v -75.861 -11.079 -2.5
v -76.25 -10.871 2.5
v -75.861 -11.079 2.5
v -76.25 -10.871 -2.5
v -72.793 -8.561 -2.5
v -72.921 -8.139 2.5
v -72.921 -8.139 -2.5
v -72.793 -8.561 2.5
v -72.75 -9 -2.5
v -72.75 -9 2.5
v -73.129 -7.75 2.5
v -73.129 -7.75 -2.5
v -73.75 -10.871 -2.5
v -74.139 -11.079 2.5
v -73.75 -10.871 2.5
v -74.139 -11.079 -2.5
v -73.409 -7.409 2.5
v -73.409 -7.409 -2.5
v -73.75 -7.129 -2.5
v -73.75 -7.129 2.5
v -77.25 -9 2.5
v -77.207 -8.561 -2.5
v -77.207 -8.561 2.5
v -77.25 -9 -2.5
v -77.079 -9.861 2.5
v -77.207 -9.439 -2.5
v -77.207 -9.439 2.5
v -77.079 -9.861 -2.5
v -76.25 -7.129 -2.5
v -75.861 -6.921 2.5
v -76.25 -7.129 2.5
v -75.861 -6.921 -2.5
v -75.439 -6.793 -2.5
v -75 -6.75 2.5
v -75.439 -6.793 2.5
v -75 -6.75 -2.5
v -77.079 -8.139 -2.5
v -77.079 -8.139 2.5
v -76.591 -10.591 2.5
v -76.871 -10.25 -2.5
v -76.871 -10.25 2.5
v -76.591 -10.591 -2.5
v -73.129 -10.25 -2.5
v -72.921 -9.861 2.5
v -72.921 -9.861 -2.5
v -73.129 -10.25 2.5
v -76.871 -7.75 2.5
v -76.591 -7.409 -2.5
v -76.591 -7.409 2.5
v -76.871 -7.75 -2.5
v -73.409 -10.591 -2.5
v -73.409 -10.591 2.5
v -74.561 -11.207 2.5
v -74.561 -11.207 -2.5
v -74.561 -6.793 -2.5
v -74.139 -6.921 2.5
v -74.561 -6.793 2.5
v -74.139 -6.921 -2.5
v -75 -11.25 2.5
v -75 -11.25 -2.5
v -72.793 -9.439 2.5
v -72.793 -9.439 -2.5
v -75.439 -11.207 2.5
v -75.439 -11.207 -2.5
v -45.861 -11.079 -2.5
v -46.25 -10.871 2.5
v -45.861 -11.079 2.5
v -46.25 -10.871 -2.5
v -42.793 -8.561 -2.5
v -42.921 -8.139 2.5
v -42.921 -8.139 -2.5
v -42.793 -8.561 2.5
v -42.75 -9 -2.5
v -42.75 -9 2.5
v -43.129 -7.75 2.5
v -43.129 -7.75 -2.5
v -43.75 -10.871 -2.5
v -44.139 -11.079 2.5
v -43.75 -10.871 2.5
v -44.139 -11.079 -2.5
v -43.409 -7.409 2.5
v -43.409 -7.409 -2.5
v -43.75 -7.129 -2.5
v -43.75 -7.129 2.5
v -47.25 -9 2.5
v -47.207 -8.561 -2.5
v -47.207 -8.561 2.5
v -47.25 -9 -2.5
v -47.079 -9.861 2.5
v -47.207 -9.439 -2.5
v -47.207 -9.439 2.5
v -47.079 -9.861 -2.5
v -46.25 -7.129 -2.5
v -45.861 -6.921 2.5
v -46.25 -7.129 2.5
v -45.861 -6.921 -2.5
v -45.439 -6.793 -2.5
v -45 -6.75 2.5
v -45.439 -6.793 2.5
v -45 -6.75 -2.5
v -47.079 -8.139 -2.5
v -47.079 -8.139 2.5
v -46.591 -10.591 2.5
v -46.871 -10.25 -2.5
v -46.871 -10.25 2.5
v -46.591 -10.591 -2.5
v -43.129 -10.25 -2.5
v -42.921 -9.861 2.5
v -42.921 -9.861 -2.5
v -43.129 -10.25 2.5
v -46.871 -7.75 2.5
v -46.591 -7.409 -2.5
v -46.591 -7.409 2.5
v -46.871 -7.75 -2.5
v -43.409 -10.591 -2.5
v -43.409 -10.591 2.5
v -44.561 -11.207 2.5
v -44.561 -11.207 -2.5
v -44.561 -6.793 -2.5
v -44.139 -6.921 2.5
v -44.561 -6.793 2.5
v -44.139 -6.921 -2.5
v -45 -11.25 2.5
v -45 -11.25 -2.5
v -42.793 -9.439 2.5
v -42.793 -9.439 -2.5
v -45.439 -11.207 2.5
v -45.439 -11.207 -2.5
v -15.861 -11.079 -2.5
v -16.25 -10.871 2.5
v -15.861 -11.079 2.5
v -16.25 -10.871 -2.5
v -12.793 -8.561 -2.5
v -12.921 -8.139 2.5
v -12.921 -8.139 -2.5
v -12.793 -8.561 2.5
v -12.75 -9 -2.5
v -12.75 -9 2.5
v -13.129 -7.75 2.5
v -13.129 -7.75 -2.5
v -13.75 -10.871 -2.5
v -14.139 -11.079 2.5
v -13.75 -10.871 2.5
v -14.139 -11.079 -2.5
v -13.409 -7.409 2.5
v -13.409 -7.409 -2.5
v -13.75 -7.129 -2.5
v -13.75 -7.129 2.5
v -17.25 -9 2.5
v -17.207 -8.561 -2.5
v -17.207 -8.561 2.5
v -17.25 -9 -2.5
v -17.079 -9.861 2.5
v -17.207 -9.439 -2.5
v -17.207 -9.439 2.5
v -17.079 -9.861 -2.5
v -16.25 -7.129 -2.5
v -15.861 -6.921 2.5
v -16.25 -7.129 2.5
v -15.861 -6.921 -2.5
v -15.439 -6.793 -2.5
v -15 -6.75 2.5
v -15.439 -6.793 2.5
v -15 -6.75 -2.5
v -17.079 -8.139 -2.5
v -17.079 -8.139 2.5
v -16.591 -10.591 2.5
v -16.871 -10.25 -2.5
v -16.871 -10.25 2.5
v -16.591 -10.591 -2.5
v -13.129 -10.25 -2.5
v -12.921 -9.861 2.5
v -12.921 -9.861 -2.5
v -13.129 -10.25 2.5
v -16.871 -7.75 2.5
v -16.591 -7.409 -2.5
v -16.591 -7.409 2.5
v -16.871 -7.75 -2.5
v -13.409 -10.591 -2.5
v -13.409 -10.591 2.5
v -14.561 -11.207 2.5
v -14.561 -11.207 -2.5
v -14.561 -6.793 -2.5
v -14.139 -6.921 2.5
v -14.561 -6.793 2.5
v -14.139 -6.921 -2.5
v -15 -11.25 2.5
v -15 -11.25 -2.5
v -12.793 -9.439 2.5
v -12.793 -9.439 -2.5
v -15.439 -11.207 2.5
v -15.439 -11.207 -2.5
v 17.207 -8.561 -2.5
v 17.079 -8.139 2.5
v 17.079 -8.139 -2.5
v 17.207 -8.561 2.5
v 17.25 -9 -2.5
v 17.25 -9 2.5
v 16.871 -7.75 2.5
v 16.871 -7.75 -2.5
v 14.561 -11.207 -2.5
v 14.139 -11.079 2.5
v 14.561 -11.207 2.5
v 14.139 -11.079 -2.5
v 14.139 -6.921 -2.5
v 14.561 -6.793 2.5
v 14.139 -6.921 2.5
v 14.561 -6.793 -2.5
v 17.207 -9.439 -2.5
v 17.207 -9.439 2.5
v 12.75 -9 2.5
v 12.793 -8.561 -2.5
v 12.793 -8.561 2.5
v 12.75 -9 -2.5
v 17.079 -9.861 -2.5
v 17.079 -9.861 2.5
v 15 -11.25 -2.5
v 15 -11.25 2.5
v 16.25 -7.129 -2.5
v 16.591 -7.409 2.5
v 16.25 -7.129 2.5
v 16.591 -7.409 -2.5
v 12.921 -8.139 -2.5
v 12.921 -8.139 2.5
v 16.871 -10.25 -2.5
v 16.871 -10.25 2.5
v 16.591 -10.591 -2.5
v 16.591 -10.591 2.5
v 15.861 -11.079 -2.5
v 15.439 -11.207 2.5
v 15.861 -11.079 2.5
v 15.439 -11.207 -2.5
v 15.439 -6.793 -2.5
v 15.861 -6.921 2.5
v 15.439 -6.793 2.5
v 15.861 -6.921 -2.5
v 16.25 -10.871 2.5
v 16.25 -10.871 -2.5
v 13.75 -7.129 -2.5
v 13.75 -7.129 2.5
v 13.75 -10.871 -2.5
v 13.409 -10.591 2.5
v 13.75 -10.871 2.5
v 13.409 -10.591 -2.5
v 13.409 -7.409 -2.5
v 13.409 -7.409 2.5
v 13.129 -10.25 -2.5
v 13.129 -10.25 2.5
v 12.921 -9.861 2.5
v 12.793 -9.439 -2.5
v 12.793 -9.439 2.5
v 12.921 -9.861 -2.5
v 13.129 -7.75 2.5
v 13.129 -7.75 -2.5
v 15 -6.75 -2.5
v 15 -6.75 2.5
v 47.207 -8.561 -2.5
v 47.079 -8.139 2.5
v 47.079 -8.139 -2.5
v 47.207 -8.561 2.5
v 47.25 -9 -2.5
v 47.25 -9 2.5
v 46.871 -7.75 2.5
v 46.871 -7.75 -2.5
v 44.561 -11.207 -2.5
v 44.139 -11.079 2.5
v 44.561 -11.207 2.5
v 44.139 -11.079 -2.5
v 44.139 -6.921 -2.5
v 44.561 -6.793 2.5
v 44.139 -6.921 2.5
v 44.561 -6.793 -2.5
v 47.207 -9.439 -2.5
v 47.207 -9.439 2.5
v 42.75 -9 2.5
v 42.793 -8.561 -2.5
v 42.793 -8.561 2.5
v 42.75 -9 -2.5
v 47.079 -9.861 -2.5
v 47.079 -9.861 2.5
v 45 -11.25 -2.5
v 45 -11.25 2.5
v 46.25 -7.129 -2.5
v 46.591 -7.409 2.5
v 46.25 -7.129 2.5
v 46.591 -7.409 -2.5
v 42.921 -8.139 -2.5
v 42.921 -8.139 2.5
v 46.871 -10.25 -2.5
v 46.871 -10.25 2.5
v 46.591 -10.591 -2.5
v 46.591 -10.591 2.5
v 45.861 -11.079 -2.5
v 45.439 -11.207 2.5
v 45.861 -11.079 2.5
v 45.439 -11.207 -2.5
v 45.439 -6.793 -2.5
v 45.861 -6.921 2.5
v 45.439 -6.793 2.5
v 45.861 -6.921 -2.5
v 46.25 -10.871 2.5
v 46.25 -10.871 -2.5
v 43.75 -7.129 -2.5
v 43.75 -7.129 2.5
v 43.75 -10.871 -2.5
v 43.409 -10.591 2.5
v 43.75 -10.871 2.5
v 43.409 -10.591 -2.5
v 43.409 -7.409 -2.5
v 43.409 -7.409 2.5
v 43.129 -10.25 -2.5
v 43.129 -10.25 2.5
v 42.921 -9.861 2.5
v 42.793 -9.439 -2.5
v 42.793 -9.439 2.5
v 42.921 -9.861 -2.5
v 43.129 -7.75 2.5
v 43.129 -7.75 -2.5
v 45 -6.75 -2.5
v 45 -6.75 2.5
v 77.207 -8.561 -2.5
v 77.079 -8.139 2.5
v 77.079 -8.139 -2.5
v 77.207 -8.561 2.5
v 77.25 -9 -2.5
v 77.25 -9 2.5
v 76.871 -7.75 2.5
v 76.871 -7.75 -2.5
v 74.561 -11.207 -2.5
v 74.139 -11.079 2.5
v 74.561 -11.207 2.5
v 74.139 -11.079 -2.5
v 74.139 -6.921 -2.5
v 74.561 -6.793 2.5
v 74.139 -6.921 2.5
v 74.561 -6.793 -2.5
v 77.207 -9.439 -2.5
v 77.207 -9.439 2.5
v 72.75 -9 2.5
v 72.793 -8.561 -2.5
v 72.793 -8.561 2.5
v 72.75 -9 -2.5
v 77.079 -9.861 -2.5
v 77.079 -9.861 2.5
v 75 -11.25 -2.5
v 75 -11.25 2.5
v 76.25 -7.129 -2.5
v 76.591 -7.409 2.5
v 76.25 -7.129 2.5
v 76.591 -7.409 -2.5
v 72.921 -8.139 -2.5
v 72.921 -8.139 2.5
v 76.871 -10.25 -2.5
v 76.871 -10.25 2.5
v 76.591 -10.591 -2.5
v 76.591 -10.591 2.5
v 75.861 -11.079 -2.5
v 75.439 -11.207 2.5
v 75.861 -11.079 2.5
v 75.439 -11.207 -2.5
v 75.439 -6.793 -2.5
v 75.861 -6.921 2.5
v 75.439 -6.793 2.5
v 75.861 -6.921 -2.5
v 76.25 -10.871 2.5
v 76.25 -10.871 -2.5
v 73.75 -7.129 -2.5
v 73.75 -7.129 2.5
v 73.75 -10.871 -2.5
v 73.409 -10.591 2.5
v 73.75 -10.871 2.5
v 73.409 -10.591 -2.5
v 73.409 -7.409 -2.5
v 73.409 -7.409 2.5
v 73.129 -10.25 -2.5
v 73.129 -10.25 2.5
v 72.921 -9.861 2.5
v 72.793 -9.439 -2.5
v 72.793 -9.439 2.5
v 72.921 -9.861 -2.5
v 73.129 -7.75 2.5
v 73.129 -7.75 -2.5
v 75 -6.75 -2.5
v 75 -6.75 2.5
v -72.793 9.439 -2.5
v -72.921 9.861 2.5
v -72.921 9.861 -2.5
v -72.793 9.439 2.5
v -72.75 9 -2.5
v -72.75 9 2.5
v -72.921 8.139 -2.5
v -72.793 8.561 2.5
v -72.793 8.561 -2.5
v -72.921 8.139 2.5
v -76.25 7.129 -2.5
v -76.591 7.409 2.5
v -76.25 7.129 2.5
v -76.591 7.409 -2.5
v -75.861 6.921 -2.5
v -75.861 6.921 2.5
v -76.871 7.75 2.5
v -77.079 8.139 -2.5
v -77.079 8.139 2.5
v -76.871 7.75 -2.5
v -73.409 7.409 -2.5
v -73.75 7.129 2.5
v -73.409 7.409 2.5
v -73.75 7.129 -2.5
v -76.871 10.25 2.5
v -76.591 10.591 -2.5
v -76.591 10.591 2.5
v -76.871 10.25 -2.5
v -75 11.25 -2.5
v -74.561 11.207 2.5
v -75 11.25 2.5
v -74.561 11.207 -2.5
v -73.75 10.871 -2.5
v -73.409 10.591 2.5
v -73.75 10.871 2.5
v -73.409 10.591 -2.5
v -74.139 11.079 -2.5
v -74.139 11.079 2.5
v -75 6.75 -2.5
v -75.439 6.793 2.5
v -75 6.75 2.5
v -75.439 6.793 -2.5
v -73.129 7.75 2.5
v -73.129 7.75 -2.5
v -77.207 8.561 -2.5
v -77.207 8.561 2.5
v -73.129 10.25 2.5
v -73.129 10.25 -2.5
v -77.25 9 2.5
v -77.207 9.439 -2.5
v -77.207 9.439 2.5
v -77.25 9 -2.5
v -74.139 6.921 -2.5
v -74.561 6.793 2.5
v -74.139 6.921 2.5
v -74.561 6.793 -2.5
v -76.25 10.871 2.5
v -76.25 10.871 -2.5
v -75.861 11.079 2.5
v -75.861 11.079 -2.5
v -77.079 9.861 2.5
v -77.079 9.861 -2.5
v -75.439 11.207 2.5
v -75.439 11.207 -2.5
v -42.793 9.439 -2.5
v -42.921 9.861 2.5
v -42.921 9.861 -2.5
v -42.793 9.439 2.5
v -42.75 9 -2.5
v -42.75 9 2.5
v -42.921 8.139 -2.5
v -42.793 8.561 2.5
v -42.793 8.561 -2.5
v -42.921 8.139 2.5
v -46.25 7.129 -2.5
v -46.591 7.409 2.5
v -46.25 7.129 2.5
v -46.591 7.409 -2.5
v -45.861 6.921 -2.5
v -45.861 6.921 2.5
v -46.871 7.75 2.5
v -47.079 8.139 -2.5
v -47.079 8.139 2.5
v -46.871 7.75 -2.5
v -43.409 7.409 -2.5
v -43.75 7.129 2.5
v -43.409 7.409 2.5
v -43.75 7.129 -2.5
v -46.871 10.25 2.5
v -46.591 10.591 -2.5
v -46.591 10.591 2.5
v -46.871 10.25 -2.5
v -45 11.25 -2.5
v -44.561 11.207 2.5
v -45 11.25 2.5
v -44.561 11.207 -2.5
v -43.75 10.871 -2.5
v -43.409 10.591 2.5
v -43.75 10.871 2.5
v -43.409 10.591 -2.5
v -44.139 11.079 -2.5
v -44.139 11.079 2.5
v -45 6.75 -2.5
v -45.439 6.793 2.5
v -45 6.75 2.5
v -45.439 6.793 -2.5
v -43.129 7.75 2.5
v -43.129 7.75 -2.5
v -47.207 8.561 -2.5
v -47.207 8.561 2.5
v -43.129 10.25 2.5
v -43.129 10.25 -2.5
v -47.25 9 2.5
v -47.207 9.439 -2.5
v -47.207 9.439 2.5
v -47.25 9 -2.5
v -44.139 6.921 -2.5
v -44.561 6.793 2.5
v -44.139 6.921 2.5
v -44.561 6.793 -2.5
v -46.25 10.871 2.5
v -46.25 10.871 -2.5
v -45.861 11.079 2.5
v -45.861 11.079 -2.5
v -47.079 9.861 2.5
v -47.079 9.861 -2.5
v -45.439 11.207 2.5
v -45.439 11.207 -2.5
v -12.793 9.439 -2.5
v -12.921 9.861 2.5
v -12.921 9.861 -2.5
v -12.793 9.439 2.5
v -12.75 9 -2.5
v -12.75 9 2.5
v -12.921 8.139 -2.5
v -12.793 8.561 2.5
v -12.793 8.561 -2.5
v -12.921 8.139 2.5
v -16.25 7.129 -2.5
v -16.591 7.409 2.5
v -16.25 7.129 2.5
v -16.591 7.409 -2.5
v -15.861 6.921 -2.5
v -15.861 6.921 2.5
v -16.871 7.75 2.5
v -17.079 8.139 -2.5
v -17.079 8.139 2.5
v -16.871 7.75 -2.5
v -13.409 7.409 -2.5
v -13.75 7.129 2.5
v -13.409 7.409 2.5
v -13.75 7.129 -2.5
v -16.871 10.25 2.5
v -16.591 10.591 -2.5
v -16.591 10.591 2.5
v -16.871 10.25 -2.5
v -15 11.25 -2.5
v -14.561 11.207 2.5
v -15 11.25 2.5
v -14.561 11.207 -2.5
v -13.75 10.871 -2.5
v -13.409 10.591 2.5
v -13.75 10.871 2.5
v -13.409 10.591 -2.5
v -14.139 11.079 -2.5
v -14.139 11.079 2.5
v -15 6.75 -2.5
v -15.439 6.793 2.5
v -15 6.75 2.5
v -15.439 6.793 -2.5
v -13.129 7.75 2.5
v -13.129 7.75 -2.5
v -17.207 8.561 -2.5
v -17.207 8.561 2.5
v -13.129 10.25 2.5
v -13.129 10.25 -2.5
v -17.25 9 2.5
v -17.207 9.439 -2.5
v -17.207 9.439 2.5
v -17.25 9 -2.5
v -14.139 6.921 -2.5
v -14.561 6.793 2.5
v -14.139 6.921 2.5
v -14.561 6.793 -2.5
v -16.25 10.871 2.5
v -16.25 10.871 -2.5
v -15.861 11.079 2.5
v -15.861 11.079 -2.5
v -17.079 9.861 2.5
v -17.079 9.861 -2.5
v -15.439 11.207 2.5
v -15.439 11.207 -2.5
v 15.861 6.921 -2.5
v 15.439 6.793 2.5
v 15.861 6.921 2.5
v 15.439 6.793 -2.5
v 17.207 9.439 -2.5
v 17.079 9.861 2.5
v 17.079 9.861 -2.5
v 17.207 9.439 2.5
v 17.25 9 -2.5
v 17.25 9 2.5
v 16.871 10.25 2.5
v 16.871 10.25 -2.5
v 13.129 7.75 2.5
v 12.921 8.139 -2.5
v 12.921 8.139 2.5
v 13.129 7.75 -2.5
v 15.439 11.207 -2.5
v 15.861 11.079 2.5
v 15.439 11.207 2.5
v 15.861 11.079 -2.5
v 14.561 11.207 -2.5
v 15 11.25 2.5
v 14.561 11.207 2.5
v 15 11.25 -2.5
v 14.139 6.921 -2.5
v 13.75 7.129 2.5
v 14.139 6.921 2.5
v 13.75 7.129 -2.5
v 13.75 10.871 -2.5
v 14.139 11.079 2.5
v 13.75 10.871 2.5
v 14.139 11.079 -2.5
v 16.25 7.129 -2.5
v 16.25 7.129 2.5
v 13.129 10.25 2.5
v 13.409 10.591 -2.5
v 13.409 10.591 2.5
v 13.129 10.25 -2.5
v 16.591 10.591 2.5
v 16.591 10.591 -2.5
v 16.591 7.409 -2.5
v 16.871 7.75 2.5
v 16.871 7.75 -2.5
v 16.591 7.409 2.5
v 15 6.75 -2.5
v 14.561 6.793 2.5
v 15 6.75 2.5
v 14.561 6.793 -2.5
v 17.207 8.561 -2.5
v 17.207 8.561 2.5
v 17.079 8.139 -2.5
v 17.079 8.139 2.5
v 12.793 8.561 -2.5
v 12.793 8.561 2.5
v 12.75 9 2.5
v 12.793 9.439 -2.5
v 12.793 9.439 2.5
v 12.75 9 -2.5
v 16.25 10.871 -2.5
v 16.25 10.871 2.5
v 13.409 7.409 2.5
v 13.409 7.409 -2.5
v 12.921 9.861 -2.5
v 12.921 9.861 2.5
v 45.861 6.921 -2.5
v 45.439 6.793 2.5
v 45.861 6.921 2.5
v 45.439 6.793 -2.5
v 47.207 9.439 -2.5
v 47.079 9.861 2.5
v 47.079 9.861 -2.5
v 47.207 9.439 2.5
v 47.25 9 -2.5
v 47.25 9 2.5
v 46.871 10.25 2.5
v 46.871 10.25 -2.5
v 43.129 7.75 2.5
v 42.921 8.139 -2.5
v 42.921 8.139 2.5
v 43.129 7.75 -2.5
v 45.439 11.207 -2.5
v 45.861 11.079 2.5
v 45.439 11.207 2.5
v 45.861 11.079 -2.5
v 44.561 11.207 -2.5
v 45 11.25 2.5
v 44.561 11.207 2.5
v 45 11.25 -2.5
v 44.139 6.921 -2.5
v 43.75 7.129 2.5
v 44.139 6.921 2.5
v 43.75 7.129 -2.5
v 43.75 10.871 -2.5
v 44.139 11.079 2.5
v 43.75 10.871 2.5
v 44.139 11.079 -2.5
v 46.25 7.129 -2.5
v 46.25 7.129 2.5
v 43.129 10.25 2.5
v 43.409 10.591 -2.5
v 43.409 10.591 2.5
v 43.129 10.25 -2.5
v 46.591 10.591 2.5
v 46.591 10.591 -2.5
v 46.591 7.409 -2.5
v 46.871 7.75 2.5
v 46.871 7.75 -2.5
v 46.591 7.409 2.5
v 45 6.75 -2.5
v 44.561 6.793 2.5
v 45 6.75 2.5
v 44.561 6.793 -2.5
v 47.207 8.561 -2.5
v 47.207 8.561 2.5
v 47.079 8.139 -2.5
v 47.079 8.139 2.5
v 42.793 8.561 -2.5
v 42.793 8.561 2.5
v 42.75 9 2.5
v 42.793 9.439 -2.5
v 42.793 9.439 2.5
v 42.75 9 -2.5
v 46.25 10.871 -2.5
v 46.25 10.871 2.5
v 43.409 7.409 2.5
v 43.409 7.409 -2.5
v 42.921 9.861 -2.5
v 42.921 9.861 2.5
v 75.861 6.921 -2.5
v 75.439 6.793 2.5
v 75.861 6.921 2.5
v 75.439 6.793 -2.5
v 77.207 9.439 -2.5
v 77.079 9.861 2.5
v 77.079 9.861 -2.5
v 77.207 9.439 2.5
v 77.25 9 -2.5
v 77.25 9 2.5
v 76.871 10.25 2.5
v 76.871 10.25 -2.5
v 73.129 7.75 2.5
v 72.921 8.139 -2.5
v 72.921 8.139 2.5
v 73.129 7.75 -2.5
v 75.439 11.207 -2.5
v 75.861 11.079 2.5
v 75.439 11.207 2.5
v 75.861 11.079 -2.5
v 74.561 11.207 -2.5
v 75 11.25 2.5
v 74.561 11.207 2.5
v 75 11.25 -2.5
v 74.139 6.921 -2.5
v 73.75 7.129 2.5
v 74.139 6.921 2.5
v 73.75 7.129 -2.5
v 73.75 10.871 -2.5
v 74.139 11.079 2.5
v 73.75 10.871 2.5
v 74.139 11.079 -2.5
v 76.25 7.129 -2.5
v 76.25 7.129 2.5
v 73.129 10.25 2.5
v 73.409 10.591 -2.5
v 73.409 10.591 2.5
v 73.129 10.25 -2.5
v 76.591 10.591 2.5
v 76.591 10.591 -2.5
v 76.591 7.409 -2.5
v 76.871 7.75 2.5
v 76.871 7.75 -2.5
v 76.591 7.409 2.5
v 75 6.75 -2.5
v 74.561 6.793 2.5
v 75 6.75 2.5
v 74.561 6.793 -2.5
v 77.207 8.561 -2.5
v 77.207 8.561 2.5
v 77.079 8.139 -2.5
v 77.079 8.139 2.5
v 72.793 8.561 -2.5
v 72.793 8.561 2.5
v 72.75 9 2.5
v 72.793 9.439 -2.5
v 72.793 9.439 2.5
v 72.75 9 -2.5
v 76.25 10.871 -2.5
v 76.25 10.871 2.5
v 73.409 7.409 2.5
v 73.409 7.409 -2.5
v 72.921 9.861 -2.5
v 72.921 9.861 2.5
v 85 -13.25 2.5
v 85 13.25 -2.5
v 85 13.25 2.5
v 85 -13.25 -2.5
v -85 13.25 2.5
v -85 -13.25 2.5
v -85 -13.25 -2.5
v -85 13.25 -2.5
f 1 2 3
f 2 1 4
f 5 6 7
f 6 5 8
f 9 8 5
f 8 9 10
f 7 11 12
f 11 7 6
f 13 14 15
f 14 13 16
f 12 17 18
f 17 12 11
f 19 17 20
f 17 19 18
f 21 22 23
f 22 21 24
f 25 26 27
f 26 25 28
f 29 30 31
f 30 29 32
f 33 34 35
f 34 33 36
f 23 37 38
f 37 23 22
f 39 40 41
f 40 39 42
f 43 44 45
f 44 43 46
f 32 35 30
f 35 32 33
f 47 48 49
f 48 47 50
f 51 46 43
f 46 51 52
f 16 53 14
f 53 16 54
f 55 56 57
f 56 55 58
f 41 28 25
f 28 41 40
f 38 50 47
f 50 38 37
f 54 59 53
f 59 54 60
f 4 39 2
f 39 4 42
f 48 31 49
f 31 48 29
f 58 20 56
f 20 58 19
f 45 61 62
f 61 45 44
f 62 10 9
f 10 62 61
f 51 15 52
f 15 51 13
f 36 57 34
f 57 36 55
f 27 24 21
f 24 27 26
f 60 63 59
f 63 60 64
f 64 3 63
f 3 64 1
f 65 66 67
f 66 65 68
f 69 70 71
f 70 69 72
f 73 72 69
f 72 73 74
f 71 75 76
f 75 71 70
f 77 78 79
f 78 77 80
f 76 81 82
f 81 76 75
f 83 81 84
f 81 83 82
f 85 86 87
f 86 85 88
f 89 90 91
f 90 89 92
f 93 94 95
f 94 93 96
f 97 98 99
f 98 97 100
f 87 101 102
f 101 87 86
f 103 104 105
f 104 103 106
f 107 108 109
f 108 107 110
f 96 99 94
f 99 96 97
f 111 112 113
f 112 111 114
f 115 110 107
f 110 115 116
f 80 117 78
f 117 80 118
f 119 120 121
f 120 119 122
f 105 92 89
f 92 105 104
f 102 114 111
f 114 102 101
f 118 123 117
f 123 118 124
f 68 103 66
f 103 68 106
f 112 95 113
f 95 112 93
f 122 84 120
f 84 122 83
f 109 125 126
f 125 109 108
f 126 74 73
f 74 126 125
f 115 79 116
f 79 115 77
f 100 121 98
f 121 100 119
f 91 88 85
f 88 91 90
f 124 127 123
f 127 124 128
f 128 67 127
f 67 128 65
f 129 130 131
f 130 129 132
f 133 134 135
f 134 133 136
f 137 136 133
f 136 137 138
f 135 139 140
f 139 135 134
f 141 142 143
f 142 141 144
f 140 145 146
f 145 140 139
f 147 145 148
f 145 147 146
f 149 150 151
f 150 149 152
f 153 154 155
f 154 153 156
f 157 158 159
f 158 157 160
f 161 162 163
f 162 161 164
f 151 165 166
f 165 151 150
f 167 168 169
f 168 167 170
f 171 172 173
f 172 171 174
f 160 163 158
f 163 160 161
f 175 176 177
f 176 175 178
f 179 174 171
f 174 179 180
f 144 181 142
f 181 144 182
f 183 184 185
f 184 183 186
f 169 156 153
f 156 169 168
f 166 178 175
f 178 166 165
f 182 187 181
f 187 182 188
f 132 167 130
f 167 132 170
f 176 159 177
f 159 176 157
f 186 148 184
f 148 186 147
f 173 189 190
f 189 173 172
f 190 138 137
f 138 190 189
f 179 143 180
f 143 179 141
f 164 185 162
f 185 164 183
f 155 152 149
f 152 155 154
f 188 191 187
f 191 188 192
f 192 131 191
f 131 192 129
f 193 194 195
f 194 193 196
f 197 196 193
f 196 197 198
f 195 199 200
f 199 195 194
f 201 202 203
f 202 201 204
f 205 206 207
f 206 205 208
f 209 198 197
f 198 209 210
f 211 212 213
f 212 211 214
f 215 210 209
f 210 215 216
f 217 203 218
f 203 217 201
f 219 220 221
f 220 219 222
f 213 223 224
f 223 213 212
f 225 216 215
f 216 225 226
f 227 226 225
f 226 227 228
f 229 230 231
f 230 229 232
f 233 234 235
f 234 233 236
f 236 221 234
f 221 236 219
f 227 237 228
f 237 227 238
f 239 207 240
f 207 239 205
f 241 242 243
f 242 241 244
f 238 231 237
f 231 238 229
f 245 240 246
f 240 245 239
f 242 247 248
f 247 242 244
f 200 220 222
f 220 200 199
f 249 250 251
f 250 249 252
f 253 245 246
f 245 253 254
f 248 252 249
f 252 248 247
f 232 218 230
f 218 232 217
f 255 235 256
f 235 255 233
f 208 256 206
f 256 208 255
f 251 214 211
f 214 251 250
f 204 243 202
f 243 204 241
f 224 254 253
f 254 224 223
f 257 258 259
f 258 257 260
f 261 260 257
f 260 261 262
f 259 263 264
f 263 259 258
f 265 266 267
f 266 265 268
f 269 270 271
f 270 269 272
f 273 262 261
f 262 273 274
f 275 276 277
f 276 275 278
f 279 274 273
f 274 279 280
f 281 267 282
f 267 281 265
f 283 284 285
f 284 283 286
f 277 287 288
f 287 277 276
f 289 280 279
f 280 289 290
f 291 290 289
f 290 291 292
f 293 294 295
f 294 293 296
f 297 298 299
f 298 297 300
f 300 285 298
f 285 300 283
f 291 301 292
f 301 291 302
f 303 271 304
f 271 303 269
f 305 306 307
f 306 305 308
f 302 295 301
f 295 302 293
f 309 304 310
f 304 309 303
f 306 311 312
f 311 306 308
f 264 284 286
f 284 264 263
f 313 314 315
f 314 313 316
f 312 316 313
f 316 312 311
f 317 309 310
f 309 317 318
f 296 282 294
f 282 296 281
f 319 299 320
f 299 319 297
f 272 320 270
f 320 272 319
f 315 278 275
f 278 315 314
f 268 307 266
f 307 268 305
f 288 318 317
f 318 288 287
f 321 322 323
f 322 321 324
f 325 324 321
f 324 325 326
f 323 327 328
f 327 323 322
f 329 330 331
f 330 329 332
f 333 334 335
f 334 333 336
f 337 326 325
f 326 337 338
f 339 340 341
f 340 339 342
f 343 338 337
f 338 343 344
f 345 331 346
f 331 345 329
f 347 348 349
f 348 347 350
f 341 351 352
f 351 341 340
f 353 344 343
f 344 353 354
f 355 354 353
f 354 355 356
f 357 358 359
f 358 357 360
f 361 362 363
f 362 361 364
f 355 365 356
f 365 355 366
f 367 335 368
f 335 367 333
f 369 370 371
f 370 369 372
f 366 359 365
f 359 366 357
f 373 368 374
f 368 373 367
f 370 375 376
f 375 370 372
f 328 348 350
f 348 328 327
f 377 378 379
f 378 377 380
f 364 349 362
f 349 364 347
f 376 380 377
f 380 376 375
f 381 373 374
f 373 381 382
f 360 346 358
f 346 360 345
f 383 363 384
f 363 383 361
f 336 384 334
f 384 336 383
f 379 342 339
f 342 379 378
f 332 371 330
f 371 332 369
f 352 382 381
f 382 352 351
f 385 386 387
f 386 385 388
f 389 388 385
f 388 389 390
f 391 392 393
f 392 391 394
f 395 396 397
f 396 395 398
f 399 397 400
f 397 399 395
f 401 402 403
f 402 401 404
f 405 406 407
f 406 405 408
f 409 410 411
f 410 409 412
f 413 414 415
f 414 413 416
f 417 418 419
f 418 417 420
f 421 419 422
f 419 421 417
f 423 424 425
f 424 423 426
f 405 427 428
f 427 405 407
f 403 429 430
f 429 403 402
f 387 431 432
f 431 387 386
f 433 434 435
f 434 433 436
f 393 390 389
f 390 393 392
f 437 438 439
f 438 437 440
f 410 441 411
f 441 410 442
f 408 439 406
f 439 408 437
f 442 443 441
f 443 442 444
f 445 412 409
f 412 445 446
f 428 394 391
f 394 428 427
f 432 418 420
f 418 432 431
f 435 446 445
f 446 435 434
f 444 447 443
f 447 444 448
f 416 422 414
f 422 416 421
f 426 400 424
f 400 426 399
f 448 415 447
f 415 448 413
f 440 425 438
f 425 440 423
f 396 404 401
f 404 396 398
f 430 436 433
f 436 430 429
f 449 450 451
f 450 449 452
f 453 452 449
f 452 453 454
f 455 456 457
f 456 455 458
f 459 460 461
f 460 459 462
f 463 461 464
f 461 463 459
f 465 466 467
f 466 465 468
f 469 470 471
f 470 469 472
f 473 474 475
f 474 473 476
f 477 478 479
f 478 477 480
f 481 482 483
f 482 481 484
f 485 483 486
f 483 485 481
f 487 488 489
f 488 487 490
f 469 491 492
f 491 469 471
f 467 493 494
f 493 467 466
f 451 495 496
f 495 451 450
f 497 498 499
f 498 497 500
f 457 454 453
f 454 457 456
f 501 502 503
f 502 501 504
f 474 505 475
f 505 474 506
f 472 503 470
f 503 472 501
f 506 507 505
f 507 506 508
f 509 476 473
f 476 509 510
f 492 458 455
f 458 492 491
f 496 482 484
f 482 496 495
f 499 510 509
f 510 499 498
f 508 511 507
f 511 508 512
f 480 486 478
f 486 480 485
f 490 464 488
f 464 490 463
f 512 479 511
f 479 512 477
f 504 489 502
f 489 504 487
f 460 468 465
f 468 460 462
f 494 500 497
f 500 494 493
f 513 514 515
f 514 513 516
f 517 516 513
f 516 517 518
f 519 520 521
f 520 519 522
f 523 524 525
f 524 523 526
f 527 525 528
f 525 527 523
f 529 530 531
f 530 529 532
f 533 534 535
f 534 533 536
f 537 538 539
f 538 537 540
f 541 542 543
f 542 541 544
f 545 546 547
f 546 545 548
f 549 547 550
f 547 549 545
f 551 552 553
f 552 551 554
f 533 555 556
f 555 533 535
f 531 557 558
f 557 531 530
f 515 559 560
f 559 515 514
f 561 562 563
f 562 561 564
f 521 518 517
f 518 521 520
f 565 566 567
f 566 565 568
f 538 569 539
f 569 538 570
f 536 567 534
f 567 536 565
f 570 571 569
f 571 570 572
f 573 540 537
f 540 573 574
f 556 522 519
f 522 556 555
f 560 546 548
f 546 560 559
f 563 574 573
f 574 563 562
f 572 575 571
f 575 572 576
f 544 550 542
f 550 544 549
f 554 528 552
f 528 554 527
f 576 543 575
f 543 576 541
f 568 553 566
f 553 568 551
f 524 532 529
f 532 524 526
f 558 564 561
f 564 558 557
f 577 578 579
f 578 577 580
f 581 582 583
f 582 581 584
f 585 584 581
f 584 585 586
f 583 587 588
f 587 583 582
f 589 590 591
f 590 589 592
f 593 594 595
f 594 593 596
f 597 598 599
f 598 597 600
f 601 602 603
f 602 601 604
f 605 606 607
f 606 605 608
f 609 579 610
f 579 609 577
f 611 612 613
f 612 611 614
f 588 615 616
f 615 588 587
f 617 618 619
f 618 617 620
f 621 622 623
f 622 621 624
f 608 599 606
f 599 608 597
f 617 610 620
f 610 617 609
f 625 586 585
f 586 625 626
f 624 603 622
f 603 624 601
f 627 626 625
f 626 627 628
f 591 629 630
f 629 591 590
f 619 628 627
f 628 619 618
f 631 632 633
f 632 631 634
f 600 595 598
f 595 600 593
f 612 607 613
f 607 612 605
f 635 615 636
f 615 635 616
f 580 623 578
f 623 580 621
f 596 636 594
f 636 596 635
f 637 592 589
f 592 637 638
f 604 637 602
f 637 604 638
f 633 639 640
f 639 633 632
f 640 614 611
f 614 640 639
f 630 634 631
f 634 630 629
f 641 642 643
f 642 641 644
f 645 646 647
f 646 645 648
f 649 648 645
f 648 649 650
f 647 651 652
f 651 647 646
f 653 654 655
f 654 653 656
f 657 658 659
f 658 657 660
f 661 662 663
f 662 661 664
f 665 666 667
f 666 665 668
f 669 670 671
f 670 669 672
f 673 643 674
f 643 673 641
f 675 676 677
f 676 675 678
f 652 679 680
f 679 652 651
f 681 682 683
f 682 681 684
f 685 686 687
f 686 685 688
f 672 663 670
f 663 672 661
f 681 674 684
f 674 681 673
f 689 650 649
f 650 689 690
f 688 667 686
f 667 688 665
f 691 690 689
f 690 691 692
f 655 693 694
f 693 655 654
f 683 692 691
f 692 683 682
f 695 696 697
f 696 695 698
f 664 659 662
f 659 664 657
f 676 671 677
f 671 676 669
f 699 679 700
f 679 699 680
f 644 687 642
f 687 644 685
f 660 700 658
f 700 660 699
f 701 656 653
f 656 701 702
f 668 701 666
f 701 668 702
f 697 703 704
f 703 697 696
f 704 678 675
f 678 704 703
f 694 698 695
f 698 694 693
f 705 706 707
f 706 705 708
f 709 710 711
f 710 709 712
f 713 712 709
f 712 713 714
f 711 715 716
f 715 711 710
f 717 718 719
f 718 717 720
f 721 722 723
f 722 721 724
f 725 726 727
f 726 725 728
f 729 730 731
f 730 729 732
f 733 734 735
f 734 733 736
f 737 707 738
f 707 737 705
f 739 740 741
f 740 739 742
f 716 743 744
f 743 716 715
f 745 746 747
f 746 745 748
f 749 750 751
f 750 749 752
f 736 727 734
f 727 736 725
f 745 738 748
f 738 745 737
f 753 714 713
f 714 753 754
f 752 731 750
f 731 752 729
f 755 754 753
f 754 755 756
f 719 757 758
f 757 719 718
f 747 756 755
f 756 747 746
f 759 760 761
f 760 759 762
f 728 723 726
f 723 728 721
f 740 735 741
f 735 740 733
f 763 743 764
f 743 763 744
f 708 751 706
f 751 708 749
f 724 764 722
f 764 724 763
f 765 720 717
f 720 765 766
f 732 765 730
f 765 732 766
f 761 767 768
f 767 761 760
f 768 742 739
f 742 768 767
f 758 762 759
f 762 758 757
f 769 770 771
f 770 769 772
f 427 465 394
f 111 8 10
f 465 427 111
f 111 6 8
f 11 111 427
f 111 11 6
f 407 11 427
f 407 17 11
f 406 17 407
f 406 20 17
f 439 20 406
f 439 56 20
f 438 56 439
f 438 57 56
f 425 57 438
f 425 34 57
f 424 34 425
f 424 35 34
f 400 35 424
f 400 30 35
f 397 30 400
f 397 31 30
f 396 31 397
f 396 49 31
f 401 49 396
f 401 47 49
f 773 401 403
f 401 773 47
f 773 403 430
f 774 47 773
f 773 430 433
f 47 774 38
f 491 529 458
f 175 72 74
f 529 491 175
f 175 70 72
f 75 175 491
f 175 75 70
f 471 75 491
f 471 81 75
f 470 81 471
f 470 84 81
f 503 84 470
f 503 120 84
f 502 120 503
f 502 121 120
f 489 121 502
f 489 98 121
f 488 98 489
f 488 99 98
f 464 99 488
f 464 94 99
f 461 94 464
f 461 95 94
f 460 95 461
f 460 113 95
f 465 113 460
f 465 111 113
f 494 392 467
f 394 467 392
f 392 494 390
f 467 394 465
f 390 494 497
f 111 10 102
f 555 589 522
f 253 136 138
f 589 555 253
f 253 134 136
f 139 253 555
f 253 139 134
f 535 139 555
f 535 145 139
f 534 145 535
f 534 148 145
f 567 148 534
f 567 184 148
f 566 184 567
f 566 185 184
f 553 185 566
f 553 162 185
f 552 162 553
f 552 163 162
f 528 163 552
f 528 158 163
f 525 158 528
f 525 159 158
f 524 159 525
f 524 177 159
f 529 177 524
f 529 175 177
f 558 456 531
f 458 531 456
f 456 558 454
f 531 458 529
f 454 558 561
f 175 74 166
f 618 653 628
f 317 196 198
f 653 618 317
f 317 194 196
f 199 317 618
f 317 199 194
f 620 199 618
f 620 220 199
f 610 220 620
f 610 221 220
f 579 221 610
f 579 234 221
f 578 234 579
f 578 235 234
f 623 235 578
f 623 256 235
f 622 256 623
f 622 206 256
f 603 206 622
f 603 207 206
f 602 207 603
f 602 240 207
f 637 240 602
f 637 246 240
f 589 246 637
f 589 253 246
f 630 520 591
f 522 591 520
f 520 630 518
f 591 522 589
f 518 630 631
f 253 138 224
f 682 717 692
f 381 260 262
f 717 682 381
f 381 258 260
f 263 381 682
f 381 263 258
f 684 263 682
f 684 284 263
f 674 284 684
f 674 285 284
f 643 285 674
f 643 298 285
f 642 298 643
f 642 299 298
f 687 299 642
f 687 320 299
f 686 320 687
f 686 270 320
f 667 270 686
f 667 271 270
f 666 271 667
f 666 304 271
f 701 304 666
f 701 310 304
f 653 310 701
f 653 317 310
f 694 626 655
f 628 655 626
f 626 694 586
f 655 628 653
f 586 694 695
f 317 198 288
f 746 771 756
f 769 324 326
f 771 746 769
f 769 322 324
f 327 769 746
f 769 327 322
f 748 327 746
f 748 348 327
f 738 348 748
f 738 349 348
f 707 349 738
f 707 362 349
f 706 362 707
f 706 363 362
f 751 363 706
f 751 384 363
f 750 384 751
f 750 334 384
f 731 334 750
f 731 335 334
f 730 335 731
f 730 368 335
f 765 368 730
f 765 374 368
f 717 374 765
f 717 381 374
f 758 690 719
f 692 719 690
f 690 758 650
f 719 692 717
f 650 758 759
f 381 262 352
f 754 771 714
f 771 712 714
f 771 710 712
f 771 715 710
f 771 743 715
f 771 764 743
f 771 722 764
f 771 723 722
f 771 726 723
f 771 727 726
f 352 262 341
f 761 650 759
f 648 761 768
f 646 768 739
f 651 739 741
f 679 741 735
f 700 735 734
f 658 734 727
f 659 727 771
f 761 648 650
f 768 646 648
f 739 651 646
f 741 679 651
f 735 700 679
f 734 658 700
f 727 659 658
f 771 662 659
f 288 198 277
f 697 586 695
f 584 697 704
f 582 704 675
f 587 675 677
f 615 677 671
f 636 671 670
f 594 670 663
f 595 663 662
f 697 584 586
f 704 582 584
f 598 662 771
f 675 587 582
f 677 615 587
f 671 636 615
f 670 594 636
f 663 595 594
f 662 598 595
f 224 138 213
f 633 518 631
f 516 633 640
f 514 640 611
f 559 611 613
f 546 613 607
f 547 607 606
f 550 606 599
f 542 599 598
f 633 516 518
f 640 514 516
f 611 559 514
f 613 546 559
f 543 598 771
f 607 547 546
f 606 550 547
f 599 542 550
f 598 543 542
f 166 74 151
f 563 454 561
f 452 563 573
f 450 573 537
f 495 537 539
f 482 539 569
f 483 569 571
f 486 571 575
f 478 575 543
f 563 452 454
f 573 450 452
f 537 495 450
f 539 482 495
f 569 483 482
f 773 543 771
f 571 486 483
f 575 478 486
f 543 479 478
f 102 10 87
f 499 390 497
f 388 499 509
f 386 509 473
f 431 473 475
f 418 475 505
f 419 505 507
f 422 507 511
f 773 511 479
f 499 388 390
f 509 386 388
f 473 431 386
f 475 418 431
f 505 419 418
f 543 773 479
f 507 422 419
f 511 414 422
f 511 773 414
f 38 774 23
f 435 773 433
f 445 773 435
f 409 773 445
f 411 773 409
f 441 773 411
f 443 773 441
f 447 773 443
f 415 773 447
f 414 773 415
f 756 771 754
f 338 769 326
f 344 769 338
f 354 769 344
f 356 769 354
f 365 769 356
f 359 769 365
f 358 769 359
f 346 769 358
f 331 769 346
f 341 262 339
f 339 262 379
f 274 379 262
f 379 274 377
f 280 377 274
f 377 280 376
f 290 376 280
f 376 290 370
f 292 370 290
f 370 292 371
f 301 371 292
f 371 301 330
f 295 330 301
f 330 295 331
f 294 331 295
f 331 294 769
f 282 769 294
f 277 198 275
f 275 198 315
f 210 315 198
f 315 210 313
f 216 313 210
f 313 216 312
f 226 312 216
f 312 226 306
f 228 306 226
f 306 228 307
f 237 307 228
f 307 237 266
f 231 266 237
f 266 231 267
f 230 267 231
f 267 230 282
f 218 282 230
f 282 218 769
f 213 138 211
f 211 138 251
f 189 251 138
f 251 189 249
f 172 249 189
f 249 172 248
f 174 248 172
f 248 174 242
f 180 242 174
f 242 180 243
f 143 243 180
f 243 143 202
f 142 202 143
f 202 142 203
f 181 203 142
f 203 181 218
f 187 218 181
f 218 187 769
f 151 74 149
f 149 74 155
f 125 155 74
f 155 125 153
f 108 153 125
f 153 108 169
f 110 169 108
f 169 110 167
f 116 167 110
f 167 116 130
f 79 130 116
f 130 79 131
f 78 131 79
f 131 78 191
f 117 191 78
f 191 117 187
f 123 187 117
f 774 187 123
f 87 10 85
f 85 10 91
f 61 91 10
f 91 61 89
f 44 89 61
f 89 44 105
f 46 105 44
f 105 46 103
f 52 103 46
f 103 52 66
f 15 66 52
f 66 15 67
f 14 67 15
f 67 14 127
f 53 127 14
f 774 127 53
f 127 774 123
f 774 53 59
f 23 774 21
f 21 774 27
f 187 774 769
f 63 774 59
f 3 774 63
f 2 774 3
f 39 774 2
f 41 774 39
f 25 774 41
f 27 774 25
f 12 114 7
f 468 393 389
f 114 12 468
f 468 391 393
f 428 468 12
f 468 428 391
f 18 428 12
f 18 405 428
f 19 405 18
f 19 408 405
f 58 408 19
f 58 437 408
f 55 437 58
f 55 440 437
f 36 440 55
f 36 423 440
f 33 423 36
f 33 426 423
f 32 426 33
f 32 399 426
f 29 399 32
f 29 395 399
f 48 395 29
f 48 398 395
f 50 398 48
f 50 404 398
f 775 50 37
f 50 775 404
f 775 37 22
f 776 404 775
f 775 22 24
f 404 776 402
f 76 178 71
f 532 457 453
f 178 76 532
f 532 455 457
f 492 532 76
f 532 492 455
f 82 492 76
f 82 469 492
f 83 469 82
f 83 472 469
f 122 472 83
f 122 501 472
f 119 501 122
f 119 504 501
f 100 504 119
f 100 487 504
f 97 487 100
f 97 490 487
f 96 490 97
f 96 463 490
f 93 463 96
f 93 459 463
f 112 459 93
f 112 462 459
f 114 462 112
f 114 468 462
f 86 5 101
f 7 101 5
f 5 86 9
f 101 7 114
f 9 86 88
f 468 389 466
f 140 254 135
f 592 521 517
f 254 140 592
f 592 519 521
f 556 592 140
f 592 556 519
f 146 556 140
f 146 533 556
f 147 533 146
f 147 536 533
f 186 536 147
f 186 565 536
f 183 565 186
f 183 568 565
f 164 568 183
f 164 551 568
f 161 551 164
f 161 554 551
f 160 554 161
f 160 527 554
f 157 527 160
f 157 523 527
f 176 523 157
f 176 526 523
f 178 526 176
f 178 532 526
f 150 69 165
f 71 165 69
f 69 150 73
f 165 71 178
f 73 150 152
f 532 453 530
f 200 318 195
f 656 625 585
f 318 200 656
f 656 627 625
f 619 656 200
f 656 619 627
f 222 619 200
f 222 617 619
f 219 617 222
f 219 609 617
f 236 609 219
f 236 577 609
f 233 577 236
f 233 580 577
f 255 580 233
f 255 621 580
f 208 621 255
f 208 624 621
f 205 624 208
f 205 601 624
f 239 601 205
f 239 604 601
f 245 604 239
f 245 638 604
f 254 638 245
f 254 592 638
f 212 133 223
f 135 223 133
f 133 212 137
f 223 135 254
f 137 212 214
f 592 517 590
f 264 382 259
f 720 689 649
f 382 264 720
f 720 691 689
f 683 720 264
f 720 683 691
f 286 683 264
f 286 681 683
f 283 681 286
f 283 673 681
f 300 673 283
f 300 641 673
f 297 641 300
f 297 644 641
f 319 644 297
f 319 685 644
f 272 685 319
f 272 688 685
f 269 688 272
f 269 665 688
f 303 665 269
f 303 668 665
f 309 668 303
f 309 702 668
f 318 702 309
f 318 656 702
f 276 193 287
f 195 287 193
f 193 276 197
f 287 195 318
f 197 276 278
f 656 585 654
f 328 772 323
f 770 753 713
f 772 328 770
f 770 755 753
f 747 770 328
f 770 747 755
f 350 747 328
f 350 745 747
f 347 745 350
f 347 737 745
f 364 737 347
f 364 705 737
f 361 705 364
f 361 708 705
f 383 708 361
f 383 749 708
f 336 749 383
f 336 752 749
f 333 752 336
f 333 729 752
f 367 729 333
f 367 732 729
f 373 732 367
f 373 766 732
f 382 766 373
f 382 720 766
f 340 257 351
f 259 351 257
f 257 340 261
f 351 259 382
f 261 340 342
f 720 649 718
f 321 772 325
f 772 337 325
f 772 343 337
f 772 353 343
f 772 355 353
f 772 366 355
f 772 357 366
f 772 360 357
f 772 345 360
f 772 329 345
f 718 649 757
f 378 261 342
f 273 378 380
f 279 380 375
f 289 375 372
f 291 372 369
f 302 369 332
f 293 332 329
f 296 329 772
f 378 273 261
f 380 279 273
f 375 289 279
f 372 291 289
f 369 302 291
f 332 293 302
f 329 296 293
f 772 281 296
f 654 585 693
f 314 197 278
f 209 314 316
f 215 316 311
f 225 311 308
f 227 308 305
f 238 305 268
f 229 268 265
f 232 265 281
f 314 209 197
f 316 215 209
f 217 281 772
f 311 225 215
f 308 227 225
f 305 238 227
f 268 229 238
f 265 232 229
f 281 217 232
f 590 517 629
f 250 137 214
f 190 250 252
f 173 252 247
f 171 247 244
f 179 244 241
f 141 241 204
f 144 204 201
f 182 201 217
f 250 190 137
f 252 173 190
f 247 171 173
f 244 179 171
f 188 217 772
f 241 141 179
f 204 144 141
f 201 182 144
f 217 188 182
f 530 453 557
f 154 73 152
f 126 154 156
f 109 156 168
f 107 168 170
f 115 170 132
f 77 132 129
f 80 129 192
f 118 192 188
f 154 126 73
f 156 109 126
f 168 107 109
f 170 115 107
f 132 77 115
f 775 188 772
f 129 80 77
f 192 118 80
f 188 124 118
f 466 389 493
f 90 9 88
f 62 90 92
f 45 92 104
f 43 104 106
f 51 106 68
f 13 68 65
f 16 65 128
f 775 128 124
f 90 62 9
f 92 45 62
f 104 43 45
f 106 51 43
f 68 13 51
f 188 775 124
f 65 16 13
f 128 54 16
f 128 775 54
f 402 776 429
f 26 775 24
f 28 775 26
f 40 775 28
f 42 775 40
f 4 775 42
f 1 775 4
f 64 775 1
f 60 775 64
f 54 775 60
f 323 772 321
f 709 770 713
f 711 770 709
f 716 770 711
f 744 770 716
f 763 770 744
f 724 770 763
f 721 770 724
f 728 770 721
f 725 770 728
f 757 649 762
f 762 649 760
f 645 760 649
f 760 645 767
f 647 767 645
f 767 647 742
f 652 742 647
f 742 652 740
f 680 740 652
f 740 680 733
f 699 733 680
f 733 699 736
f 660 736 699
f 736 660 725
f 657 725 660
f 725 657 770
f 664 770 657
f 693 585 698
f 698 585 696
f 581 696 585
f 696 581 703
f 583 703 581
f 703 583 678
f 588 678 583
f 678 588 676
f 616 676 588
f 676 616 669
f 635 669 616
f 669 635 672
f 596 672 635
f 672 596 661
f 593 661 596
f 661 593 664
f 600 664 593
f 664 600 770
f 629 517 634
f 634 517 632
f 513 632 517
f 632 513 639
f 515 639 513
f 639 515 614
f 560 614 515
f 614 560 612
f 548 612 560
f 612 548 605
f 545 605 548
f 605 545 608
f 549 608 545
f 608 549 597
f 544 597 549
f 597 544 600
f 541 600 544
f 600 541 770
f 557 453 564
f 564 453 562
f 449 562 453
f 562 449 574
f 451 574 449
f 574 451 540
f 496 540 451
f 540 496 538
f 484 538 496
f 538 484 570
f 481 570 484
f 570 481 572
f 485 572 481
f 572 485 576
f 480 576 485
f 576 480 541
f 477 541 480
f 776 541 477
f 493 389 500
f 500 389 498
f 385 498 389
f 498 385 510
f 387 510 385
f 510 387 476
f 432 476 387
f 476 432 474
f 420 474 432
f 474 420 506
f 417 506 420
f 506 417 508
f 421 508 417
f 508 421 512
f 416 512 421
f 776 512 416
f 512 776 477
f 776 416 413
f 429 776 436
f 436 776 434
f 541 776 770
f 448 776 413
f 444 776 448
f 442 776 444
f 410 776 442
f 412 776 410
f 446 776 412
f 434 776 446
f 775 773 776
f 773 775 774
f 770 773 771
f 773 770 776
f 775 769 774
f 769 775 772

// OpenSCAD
$fn = 32;

// ----------------------------------------------------------------------
// Hole bar, 6 x Ø4.5
// tworows layout, 10 mm edge offset
// ----------------------------------------------------------------------

// --- parameters (mm) ---
bar_w = 26.5;     // bar width (Y)
bar_t = 5;        // bar thickness (Z)
holes = 6;        // holes per row
hole_d = 4.5;     // hole diameter
edge = 10;        // offset from the bar end to the first hole
pitch = 30;       // pitch between neighbouring holes
row_offset = 18;  // distance between the two rows

// --- derived feature positions (mm) ---
span = (holes - 1) * pitch;   // = 150   distance between the end holes
bar_l = span + 2 * edge;      // = 170   overall bar length
start_x = -bar_l / 2 + edge;  // = -75   X of the first hole
feature_centers = [
  [start_x + 0 * pitch, -row_offset / 2],
  [start_x + 1 * pitch, -row_offset / 2],
  [start_x + 2 * pitch, -row_offset / 2],
  [start_x + 3 * pitch, -row_offset / 2],
  [start_x + 4 * pitch, -row_offset / 2],
  [start_x + 5 * pitch, -row_offset / 2]
];   // hole centres of the first row
row2_centers = [
  [start_x + 0 * pitch, row_offset / 2],
  [start_x + 1 * pitch, row_offset / 2],
  [start_x + 2 * pitch, row_offset / 2],
  [start_x + 3 * pitch, row_offset / 2],
  [start_x + 4 * pitch, row_offset / 2],
  [start_x + 5 * pitch, row_offset / 2]
];   // hole centres of the second row

// bar with two rows of holes, both read from their own centre arrays
difference() {
  translate([-bar_l / 2, -bar_w / 2, -bar_t / 2]) cube([bar_l, bar_w, bar_t]);
  for (centre = feature_centers)
    translate([centre[0], centre[1], 0])
      cylinder(d = hole_d, h = bar_t + 2, center = true);
  for (centre = row2_centers)
    translate([centre[0], centre[1], 0])
      cylinder(d = hole_d, h = bar_t + 2, center = true);
}
